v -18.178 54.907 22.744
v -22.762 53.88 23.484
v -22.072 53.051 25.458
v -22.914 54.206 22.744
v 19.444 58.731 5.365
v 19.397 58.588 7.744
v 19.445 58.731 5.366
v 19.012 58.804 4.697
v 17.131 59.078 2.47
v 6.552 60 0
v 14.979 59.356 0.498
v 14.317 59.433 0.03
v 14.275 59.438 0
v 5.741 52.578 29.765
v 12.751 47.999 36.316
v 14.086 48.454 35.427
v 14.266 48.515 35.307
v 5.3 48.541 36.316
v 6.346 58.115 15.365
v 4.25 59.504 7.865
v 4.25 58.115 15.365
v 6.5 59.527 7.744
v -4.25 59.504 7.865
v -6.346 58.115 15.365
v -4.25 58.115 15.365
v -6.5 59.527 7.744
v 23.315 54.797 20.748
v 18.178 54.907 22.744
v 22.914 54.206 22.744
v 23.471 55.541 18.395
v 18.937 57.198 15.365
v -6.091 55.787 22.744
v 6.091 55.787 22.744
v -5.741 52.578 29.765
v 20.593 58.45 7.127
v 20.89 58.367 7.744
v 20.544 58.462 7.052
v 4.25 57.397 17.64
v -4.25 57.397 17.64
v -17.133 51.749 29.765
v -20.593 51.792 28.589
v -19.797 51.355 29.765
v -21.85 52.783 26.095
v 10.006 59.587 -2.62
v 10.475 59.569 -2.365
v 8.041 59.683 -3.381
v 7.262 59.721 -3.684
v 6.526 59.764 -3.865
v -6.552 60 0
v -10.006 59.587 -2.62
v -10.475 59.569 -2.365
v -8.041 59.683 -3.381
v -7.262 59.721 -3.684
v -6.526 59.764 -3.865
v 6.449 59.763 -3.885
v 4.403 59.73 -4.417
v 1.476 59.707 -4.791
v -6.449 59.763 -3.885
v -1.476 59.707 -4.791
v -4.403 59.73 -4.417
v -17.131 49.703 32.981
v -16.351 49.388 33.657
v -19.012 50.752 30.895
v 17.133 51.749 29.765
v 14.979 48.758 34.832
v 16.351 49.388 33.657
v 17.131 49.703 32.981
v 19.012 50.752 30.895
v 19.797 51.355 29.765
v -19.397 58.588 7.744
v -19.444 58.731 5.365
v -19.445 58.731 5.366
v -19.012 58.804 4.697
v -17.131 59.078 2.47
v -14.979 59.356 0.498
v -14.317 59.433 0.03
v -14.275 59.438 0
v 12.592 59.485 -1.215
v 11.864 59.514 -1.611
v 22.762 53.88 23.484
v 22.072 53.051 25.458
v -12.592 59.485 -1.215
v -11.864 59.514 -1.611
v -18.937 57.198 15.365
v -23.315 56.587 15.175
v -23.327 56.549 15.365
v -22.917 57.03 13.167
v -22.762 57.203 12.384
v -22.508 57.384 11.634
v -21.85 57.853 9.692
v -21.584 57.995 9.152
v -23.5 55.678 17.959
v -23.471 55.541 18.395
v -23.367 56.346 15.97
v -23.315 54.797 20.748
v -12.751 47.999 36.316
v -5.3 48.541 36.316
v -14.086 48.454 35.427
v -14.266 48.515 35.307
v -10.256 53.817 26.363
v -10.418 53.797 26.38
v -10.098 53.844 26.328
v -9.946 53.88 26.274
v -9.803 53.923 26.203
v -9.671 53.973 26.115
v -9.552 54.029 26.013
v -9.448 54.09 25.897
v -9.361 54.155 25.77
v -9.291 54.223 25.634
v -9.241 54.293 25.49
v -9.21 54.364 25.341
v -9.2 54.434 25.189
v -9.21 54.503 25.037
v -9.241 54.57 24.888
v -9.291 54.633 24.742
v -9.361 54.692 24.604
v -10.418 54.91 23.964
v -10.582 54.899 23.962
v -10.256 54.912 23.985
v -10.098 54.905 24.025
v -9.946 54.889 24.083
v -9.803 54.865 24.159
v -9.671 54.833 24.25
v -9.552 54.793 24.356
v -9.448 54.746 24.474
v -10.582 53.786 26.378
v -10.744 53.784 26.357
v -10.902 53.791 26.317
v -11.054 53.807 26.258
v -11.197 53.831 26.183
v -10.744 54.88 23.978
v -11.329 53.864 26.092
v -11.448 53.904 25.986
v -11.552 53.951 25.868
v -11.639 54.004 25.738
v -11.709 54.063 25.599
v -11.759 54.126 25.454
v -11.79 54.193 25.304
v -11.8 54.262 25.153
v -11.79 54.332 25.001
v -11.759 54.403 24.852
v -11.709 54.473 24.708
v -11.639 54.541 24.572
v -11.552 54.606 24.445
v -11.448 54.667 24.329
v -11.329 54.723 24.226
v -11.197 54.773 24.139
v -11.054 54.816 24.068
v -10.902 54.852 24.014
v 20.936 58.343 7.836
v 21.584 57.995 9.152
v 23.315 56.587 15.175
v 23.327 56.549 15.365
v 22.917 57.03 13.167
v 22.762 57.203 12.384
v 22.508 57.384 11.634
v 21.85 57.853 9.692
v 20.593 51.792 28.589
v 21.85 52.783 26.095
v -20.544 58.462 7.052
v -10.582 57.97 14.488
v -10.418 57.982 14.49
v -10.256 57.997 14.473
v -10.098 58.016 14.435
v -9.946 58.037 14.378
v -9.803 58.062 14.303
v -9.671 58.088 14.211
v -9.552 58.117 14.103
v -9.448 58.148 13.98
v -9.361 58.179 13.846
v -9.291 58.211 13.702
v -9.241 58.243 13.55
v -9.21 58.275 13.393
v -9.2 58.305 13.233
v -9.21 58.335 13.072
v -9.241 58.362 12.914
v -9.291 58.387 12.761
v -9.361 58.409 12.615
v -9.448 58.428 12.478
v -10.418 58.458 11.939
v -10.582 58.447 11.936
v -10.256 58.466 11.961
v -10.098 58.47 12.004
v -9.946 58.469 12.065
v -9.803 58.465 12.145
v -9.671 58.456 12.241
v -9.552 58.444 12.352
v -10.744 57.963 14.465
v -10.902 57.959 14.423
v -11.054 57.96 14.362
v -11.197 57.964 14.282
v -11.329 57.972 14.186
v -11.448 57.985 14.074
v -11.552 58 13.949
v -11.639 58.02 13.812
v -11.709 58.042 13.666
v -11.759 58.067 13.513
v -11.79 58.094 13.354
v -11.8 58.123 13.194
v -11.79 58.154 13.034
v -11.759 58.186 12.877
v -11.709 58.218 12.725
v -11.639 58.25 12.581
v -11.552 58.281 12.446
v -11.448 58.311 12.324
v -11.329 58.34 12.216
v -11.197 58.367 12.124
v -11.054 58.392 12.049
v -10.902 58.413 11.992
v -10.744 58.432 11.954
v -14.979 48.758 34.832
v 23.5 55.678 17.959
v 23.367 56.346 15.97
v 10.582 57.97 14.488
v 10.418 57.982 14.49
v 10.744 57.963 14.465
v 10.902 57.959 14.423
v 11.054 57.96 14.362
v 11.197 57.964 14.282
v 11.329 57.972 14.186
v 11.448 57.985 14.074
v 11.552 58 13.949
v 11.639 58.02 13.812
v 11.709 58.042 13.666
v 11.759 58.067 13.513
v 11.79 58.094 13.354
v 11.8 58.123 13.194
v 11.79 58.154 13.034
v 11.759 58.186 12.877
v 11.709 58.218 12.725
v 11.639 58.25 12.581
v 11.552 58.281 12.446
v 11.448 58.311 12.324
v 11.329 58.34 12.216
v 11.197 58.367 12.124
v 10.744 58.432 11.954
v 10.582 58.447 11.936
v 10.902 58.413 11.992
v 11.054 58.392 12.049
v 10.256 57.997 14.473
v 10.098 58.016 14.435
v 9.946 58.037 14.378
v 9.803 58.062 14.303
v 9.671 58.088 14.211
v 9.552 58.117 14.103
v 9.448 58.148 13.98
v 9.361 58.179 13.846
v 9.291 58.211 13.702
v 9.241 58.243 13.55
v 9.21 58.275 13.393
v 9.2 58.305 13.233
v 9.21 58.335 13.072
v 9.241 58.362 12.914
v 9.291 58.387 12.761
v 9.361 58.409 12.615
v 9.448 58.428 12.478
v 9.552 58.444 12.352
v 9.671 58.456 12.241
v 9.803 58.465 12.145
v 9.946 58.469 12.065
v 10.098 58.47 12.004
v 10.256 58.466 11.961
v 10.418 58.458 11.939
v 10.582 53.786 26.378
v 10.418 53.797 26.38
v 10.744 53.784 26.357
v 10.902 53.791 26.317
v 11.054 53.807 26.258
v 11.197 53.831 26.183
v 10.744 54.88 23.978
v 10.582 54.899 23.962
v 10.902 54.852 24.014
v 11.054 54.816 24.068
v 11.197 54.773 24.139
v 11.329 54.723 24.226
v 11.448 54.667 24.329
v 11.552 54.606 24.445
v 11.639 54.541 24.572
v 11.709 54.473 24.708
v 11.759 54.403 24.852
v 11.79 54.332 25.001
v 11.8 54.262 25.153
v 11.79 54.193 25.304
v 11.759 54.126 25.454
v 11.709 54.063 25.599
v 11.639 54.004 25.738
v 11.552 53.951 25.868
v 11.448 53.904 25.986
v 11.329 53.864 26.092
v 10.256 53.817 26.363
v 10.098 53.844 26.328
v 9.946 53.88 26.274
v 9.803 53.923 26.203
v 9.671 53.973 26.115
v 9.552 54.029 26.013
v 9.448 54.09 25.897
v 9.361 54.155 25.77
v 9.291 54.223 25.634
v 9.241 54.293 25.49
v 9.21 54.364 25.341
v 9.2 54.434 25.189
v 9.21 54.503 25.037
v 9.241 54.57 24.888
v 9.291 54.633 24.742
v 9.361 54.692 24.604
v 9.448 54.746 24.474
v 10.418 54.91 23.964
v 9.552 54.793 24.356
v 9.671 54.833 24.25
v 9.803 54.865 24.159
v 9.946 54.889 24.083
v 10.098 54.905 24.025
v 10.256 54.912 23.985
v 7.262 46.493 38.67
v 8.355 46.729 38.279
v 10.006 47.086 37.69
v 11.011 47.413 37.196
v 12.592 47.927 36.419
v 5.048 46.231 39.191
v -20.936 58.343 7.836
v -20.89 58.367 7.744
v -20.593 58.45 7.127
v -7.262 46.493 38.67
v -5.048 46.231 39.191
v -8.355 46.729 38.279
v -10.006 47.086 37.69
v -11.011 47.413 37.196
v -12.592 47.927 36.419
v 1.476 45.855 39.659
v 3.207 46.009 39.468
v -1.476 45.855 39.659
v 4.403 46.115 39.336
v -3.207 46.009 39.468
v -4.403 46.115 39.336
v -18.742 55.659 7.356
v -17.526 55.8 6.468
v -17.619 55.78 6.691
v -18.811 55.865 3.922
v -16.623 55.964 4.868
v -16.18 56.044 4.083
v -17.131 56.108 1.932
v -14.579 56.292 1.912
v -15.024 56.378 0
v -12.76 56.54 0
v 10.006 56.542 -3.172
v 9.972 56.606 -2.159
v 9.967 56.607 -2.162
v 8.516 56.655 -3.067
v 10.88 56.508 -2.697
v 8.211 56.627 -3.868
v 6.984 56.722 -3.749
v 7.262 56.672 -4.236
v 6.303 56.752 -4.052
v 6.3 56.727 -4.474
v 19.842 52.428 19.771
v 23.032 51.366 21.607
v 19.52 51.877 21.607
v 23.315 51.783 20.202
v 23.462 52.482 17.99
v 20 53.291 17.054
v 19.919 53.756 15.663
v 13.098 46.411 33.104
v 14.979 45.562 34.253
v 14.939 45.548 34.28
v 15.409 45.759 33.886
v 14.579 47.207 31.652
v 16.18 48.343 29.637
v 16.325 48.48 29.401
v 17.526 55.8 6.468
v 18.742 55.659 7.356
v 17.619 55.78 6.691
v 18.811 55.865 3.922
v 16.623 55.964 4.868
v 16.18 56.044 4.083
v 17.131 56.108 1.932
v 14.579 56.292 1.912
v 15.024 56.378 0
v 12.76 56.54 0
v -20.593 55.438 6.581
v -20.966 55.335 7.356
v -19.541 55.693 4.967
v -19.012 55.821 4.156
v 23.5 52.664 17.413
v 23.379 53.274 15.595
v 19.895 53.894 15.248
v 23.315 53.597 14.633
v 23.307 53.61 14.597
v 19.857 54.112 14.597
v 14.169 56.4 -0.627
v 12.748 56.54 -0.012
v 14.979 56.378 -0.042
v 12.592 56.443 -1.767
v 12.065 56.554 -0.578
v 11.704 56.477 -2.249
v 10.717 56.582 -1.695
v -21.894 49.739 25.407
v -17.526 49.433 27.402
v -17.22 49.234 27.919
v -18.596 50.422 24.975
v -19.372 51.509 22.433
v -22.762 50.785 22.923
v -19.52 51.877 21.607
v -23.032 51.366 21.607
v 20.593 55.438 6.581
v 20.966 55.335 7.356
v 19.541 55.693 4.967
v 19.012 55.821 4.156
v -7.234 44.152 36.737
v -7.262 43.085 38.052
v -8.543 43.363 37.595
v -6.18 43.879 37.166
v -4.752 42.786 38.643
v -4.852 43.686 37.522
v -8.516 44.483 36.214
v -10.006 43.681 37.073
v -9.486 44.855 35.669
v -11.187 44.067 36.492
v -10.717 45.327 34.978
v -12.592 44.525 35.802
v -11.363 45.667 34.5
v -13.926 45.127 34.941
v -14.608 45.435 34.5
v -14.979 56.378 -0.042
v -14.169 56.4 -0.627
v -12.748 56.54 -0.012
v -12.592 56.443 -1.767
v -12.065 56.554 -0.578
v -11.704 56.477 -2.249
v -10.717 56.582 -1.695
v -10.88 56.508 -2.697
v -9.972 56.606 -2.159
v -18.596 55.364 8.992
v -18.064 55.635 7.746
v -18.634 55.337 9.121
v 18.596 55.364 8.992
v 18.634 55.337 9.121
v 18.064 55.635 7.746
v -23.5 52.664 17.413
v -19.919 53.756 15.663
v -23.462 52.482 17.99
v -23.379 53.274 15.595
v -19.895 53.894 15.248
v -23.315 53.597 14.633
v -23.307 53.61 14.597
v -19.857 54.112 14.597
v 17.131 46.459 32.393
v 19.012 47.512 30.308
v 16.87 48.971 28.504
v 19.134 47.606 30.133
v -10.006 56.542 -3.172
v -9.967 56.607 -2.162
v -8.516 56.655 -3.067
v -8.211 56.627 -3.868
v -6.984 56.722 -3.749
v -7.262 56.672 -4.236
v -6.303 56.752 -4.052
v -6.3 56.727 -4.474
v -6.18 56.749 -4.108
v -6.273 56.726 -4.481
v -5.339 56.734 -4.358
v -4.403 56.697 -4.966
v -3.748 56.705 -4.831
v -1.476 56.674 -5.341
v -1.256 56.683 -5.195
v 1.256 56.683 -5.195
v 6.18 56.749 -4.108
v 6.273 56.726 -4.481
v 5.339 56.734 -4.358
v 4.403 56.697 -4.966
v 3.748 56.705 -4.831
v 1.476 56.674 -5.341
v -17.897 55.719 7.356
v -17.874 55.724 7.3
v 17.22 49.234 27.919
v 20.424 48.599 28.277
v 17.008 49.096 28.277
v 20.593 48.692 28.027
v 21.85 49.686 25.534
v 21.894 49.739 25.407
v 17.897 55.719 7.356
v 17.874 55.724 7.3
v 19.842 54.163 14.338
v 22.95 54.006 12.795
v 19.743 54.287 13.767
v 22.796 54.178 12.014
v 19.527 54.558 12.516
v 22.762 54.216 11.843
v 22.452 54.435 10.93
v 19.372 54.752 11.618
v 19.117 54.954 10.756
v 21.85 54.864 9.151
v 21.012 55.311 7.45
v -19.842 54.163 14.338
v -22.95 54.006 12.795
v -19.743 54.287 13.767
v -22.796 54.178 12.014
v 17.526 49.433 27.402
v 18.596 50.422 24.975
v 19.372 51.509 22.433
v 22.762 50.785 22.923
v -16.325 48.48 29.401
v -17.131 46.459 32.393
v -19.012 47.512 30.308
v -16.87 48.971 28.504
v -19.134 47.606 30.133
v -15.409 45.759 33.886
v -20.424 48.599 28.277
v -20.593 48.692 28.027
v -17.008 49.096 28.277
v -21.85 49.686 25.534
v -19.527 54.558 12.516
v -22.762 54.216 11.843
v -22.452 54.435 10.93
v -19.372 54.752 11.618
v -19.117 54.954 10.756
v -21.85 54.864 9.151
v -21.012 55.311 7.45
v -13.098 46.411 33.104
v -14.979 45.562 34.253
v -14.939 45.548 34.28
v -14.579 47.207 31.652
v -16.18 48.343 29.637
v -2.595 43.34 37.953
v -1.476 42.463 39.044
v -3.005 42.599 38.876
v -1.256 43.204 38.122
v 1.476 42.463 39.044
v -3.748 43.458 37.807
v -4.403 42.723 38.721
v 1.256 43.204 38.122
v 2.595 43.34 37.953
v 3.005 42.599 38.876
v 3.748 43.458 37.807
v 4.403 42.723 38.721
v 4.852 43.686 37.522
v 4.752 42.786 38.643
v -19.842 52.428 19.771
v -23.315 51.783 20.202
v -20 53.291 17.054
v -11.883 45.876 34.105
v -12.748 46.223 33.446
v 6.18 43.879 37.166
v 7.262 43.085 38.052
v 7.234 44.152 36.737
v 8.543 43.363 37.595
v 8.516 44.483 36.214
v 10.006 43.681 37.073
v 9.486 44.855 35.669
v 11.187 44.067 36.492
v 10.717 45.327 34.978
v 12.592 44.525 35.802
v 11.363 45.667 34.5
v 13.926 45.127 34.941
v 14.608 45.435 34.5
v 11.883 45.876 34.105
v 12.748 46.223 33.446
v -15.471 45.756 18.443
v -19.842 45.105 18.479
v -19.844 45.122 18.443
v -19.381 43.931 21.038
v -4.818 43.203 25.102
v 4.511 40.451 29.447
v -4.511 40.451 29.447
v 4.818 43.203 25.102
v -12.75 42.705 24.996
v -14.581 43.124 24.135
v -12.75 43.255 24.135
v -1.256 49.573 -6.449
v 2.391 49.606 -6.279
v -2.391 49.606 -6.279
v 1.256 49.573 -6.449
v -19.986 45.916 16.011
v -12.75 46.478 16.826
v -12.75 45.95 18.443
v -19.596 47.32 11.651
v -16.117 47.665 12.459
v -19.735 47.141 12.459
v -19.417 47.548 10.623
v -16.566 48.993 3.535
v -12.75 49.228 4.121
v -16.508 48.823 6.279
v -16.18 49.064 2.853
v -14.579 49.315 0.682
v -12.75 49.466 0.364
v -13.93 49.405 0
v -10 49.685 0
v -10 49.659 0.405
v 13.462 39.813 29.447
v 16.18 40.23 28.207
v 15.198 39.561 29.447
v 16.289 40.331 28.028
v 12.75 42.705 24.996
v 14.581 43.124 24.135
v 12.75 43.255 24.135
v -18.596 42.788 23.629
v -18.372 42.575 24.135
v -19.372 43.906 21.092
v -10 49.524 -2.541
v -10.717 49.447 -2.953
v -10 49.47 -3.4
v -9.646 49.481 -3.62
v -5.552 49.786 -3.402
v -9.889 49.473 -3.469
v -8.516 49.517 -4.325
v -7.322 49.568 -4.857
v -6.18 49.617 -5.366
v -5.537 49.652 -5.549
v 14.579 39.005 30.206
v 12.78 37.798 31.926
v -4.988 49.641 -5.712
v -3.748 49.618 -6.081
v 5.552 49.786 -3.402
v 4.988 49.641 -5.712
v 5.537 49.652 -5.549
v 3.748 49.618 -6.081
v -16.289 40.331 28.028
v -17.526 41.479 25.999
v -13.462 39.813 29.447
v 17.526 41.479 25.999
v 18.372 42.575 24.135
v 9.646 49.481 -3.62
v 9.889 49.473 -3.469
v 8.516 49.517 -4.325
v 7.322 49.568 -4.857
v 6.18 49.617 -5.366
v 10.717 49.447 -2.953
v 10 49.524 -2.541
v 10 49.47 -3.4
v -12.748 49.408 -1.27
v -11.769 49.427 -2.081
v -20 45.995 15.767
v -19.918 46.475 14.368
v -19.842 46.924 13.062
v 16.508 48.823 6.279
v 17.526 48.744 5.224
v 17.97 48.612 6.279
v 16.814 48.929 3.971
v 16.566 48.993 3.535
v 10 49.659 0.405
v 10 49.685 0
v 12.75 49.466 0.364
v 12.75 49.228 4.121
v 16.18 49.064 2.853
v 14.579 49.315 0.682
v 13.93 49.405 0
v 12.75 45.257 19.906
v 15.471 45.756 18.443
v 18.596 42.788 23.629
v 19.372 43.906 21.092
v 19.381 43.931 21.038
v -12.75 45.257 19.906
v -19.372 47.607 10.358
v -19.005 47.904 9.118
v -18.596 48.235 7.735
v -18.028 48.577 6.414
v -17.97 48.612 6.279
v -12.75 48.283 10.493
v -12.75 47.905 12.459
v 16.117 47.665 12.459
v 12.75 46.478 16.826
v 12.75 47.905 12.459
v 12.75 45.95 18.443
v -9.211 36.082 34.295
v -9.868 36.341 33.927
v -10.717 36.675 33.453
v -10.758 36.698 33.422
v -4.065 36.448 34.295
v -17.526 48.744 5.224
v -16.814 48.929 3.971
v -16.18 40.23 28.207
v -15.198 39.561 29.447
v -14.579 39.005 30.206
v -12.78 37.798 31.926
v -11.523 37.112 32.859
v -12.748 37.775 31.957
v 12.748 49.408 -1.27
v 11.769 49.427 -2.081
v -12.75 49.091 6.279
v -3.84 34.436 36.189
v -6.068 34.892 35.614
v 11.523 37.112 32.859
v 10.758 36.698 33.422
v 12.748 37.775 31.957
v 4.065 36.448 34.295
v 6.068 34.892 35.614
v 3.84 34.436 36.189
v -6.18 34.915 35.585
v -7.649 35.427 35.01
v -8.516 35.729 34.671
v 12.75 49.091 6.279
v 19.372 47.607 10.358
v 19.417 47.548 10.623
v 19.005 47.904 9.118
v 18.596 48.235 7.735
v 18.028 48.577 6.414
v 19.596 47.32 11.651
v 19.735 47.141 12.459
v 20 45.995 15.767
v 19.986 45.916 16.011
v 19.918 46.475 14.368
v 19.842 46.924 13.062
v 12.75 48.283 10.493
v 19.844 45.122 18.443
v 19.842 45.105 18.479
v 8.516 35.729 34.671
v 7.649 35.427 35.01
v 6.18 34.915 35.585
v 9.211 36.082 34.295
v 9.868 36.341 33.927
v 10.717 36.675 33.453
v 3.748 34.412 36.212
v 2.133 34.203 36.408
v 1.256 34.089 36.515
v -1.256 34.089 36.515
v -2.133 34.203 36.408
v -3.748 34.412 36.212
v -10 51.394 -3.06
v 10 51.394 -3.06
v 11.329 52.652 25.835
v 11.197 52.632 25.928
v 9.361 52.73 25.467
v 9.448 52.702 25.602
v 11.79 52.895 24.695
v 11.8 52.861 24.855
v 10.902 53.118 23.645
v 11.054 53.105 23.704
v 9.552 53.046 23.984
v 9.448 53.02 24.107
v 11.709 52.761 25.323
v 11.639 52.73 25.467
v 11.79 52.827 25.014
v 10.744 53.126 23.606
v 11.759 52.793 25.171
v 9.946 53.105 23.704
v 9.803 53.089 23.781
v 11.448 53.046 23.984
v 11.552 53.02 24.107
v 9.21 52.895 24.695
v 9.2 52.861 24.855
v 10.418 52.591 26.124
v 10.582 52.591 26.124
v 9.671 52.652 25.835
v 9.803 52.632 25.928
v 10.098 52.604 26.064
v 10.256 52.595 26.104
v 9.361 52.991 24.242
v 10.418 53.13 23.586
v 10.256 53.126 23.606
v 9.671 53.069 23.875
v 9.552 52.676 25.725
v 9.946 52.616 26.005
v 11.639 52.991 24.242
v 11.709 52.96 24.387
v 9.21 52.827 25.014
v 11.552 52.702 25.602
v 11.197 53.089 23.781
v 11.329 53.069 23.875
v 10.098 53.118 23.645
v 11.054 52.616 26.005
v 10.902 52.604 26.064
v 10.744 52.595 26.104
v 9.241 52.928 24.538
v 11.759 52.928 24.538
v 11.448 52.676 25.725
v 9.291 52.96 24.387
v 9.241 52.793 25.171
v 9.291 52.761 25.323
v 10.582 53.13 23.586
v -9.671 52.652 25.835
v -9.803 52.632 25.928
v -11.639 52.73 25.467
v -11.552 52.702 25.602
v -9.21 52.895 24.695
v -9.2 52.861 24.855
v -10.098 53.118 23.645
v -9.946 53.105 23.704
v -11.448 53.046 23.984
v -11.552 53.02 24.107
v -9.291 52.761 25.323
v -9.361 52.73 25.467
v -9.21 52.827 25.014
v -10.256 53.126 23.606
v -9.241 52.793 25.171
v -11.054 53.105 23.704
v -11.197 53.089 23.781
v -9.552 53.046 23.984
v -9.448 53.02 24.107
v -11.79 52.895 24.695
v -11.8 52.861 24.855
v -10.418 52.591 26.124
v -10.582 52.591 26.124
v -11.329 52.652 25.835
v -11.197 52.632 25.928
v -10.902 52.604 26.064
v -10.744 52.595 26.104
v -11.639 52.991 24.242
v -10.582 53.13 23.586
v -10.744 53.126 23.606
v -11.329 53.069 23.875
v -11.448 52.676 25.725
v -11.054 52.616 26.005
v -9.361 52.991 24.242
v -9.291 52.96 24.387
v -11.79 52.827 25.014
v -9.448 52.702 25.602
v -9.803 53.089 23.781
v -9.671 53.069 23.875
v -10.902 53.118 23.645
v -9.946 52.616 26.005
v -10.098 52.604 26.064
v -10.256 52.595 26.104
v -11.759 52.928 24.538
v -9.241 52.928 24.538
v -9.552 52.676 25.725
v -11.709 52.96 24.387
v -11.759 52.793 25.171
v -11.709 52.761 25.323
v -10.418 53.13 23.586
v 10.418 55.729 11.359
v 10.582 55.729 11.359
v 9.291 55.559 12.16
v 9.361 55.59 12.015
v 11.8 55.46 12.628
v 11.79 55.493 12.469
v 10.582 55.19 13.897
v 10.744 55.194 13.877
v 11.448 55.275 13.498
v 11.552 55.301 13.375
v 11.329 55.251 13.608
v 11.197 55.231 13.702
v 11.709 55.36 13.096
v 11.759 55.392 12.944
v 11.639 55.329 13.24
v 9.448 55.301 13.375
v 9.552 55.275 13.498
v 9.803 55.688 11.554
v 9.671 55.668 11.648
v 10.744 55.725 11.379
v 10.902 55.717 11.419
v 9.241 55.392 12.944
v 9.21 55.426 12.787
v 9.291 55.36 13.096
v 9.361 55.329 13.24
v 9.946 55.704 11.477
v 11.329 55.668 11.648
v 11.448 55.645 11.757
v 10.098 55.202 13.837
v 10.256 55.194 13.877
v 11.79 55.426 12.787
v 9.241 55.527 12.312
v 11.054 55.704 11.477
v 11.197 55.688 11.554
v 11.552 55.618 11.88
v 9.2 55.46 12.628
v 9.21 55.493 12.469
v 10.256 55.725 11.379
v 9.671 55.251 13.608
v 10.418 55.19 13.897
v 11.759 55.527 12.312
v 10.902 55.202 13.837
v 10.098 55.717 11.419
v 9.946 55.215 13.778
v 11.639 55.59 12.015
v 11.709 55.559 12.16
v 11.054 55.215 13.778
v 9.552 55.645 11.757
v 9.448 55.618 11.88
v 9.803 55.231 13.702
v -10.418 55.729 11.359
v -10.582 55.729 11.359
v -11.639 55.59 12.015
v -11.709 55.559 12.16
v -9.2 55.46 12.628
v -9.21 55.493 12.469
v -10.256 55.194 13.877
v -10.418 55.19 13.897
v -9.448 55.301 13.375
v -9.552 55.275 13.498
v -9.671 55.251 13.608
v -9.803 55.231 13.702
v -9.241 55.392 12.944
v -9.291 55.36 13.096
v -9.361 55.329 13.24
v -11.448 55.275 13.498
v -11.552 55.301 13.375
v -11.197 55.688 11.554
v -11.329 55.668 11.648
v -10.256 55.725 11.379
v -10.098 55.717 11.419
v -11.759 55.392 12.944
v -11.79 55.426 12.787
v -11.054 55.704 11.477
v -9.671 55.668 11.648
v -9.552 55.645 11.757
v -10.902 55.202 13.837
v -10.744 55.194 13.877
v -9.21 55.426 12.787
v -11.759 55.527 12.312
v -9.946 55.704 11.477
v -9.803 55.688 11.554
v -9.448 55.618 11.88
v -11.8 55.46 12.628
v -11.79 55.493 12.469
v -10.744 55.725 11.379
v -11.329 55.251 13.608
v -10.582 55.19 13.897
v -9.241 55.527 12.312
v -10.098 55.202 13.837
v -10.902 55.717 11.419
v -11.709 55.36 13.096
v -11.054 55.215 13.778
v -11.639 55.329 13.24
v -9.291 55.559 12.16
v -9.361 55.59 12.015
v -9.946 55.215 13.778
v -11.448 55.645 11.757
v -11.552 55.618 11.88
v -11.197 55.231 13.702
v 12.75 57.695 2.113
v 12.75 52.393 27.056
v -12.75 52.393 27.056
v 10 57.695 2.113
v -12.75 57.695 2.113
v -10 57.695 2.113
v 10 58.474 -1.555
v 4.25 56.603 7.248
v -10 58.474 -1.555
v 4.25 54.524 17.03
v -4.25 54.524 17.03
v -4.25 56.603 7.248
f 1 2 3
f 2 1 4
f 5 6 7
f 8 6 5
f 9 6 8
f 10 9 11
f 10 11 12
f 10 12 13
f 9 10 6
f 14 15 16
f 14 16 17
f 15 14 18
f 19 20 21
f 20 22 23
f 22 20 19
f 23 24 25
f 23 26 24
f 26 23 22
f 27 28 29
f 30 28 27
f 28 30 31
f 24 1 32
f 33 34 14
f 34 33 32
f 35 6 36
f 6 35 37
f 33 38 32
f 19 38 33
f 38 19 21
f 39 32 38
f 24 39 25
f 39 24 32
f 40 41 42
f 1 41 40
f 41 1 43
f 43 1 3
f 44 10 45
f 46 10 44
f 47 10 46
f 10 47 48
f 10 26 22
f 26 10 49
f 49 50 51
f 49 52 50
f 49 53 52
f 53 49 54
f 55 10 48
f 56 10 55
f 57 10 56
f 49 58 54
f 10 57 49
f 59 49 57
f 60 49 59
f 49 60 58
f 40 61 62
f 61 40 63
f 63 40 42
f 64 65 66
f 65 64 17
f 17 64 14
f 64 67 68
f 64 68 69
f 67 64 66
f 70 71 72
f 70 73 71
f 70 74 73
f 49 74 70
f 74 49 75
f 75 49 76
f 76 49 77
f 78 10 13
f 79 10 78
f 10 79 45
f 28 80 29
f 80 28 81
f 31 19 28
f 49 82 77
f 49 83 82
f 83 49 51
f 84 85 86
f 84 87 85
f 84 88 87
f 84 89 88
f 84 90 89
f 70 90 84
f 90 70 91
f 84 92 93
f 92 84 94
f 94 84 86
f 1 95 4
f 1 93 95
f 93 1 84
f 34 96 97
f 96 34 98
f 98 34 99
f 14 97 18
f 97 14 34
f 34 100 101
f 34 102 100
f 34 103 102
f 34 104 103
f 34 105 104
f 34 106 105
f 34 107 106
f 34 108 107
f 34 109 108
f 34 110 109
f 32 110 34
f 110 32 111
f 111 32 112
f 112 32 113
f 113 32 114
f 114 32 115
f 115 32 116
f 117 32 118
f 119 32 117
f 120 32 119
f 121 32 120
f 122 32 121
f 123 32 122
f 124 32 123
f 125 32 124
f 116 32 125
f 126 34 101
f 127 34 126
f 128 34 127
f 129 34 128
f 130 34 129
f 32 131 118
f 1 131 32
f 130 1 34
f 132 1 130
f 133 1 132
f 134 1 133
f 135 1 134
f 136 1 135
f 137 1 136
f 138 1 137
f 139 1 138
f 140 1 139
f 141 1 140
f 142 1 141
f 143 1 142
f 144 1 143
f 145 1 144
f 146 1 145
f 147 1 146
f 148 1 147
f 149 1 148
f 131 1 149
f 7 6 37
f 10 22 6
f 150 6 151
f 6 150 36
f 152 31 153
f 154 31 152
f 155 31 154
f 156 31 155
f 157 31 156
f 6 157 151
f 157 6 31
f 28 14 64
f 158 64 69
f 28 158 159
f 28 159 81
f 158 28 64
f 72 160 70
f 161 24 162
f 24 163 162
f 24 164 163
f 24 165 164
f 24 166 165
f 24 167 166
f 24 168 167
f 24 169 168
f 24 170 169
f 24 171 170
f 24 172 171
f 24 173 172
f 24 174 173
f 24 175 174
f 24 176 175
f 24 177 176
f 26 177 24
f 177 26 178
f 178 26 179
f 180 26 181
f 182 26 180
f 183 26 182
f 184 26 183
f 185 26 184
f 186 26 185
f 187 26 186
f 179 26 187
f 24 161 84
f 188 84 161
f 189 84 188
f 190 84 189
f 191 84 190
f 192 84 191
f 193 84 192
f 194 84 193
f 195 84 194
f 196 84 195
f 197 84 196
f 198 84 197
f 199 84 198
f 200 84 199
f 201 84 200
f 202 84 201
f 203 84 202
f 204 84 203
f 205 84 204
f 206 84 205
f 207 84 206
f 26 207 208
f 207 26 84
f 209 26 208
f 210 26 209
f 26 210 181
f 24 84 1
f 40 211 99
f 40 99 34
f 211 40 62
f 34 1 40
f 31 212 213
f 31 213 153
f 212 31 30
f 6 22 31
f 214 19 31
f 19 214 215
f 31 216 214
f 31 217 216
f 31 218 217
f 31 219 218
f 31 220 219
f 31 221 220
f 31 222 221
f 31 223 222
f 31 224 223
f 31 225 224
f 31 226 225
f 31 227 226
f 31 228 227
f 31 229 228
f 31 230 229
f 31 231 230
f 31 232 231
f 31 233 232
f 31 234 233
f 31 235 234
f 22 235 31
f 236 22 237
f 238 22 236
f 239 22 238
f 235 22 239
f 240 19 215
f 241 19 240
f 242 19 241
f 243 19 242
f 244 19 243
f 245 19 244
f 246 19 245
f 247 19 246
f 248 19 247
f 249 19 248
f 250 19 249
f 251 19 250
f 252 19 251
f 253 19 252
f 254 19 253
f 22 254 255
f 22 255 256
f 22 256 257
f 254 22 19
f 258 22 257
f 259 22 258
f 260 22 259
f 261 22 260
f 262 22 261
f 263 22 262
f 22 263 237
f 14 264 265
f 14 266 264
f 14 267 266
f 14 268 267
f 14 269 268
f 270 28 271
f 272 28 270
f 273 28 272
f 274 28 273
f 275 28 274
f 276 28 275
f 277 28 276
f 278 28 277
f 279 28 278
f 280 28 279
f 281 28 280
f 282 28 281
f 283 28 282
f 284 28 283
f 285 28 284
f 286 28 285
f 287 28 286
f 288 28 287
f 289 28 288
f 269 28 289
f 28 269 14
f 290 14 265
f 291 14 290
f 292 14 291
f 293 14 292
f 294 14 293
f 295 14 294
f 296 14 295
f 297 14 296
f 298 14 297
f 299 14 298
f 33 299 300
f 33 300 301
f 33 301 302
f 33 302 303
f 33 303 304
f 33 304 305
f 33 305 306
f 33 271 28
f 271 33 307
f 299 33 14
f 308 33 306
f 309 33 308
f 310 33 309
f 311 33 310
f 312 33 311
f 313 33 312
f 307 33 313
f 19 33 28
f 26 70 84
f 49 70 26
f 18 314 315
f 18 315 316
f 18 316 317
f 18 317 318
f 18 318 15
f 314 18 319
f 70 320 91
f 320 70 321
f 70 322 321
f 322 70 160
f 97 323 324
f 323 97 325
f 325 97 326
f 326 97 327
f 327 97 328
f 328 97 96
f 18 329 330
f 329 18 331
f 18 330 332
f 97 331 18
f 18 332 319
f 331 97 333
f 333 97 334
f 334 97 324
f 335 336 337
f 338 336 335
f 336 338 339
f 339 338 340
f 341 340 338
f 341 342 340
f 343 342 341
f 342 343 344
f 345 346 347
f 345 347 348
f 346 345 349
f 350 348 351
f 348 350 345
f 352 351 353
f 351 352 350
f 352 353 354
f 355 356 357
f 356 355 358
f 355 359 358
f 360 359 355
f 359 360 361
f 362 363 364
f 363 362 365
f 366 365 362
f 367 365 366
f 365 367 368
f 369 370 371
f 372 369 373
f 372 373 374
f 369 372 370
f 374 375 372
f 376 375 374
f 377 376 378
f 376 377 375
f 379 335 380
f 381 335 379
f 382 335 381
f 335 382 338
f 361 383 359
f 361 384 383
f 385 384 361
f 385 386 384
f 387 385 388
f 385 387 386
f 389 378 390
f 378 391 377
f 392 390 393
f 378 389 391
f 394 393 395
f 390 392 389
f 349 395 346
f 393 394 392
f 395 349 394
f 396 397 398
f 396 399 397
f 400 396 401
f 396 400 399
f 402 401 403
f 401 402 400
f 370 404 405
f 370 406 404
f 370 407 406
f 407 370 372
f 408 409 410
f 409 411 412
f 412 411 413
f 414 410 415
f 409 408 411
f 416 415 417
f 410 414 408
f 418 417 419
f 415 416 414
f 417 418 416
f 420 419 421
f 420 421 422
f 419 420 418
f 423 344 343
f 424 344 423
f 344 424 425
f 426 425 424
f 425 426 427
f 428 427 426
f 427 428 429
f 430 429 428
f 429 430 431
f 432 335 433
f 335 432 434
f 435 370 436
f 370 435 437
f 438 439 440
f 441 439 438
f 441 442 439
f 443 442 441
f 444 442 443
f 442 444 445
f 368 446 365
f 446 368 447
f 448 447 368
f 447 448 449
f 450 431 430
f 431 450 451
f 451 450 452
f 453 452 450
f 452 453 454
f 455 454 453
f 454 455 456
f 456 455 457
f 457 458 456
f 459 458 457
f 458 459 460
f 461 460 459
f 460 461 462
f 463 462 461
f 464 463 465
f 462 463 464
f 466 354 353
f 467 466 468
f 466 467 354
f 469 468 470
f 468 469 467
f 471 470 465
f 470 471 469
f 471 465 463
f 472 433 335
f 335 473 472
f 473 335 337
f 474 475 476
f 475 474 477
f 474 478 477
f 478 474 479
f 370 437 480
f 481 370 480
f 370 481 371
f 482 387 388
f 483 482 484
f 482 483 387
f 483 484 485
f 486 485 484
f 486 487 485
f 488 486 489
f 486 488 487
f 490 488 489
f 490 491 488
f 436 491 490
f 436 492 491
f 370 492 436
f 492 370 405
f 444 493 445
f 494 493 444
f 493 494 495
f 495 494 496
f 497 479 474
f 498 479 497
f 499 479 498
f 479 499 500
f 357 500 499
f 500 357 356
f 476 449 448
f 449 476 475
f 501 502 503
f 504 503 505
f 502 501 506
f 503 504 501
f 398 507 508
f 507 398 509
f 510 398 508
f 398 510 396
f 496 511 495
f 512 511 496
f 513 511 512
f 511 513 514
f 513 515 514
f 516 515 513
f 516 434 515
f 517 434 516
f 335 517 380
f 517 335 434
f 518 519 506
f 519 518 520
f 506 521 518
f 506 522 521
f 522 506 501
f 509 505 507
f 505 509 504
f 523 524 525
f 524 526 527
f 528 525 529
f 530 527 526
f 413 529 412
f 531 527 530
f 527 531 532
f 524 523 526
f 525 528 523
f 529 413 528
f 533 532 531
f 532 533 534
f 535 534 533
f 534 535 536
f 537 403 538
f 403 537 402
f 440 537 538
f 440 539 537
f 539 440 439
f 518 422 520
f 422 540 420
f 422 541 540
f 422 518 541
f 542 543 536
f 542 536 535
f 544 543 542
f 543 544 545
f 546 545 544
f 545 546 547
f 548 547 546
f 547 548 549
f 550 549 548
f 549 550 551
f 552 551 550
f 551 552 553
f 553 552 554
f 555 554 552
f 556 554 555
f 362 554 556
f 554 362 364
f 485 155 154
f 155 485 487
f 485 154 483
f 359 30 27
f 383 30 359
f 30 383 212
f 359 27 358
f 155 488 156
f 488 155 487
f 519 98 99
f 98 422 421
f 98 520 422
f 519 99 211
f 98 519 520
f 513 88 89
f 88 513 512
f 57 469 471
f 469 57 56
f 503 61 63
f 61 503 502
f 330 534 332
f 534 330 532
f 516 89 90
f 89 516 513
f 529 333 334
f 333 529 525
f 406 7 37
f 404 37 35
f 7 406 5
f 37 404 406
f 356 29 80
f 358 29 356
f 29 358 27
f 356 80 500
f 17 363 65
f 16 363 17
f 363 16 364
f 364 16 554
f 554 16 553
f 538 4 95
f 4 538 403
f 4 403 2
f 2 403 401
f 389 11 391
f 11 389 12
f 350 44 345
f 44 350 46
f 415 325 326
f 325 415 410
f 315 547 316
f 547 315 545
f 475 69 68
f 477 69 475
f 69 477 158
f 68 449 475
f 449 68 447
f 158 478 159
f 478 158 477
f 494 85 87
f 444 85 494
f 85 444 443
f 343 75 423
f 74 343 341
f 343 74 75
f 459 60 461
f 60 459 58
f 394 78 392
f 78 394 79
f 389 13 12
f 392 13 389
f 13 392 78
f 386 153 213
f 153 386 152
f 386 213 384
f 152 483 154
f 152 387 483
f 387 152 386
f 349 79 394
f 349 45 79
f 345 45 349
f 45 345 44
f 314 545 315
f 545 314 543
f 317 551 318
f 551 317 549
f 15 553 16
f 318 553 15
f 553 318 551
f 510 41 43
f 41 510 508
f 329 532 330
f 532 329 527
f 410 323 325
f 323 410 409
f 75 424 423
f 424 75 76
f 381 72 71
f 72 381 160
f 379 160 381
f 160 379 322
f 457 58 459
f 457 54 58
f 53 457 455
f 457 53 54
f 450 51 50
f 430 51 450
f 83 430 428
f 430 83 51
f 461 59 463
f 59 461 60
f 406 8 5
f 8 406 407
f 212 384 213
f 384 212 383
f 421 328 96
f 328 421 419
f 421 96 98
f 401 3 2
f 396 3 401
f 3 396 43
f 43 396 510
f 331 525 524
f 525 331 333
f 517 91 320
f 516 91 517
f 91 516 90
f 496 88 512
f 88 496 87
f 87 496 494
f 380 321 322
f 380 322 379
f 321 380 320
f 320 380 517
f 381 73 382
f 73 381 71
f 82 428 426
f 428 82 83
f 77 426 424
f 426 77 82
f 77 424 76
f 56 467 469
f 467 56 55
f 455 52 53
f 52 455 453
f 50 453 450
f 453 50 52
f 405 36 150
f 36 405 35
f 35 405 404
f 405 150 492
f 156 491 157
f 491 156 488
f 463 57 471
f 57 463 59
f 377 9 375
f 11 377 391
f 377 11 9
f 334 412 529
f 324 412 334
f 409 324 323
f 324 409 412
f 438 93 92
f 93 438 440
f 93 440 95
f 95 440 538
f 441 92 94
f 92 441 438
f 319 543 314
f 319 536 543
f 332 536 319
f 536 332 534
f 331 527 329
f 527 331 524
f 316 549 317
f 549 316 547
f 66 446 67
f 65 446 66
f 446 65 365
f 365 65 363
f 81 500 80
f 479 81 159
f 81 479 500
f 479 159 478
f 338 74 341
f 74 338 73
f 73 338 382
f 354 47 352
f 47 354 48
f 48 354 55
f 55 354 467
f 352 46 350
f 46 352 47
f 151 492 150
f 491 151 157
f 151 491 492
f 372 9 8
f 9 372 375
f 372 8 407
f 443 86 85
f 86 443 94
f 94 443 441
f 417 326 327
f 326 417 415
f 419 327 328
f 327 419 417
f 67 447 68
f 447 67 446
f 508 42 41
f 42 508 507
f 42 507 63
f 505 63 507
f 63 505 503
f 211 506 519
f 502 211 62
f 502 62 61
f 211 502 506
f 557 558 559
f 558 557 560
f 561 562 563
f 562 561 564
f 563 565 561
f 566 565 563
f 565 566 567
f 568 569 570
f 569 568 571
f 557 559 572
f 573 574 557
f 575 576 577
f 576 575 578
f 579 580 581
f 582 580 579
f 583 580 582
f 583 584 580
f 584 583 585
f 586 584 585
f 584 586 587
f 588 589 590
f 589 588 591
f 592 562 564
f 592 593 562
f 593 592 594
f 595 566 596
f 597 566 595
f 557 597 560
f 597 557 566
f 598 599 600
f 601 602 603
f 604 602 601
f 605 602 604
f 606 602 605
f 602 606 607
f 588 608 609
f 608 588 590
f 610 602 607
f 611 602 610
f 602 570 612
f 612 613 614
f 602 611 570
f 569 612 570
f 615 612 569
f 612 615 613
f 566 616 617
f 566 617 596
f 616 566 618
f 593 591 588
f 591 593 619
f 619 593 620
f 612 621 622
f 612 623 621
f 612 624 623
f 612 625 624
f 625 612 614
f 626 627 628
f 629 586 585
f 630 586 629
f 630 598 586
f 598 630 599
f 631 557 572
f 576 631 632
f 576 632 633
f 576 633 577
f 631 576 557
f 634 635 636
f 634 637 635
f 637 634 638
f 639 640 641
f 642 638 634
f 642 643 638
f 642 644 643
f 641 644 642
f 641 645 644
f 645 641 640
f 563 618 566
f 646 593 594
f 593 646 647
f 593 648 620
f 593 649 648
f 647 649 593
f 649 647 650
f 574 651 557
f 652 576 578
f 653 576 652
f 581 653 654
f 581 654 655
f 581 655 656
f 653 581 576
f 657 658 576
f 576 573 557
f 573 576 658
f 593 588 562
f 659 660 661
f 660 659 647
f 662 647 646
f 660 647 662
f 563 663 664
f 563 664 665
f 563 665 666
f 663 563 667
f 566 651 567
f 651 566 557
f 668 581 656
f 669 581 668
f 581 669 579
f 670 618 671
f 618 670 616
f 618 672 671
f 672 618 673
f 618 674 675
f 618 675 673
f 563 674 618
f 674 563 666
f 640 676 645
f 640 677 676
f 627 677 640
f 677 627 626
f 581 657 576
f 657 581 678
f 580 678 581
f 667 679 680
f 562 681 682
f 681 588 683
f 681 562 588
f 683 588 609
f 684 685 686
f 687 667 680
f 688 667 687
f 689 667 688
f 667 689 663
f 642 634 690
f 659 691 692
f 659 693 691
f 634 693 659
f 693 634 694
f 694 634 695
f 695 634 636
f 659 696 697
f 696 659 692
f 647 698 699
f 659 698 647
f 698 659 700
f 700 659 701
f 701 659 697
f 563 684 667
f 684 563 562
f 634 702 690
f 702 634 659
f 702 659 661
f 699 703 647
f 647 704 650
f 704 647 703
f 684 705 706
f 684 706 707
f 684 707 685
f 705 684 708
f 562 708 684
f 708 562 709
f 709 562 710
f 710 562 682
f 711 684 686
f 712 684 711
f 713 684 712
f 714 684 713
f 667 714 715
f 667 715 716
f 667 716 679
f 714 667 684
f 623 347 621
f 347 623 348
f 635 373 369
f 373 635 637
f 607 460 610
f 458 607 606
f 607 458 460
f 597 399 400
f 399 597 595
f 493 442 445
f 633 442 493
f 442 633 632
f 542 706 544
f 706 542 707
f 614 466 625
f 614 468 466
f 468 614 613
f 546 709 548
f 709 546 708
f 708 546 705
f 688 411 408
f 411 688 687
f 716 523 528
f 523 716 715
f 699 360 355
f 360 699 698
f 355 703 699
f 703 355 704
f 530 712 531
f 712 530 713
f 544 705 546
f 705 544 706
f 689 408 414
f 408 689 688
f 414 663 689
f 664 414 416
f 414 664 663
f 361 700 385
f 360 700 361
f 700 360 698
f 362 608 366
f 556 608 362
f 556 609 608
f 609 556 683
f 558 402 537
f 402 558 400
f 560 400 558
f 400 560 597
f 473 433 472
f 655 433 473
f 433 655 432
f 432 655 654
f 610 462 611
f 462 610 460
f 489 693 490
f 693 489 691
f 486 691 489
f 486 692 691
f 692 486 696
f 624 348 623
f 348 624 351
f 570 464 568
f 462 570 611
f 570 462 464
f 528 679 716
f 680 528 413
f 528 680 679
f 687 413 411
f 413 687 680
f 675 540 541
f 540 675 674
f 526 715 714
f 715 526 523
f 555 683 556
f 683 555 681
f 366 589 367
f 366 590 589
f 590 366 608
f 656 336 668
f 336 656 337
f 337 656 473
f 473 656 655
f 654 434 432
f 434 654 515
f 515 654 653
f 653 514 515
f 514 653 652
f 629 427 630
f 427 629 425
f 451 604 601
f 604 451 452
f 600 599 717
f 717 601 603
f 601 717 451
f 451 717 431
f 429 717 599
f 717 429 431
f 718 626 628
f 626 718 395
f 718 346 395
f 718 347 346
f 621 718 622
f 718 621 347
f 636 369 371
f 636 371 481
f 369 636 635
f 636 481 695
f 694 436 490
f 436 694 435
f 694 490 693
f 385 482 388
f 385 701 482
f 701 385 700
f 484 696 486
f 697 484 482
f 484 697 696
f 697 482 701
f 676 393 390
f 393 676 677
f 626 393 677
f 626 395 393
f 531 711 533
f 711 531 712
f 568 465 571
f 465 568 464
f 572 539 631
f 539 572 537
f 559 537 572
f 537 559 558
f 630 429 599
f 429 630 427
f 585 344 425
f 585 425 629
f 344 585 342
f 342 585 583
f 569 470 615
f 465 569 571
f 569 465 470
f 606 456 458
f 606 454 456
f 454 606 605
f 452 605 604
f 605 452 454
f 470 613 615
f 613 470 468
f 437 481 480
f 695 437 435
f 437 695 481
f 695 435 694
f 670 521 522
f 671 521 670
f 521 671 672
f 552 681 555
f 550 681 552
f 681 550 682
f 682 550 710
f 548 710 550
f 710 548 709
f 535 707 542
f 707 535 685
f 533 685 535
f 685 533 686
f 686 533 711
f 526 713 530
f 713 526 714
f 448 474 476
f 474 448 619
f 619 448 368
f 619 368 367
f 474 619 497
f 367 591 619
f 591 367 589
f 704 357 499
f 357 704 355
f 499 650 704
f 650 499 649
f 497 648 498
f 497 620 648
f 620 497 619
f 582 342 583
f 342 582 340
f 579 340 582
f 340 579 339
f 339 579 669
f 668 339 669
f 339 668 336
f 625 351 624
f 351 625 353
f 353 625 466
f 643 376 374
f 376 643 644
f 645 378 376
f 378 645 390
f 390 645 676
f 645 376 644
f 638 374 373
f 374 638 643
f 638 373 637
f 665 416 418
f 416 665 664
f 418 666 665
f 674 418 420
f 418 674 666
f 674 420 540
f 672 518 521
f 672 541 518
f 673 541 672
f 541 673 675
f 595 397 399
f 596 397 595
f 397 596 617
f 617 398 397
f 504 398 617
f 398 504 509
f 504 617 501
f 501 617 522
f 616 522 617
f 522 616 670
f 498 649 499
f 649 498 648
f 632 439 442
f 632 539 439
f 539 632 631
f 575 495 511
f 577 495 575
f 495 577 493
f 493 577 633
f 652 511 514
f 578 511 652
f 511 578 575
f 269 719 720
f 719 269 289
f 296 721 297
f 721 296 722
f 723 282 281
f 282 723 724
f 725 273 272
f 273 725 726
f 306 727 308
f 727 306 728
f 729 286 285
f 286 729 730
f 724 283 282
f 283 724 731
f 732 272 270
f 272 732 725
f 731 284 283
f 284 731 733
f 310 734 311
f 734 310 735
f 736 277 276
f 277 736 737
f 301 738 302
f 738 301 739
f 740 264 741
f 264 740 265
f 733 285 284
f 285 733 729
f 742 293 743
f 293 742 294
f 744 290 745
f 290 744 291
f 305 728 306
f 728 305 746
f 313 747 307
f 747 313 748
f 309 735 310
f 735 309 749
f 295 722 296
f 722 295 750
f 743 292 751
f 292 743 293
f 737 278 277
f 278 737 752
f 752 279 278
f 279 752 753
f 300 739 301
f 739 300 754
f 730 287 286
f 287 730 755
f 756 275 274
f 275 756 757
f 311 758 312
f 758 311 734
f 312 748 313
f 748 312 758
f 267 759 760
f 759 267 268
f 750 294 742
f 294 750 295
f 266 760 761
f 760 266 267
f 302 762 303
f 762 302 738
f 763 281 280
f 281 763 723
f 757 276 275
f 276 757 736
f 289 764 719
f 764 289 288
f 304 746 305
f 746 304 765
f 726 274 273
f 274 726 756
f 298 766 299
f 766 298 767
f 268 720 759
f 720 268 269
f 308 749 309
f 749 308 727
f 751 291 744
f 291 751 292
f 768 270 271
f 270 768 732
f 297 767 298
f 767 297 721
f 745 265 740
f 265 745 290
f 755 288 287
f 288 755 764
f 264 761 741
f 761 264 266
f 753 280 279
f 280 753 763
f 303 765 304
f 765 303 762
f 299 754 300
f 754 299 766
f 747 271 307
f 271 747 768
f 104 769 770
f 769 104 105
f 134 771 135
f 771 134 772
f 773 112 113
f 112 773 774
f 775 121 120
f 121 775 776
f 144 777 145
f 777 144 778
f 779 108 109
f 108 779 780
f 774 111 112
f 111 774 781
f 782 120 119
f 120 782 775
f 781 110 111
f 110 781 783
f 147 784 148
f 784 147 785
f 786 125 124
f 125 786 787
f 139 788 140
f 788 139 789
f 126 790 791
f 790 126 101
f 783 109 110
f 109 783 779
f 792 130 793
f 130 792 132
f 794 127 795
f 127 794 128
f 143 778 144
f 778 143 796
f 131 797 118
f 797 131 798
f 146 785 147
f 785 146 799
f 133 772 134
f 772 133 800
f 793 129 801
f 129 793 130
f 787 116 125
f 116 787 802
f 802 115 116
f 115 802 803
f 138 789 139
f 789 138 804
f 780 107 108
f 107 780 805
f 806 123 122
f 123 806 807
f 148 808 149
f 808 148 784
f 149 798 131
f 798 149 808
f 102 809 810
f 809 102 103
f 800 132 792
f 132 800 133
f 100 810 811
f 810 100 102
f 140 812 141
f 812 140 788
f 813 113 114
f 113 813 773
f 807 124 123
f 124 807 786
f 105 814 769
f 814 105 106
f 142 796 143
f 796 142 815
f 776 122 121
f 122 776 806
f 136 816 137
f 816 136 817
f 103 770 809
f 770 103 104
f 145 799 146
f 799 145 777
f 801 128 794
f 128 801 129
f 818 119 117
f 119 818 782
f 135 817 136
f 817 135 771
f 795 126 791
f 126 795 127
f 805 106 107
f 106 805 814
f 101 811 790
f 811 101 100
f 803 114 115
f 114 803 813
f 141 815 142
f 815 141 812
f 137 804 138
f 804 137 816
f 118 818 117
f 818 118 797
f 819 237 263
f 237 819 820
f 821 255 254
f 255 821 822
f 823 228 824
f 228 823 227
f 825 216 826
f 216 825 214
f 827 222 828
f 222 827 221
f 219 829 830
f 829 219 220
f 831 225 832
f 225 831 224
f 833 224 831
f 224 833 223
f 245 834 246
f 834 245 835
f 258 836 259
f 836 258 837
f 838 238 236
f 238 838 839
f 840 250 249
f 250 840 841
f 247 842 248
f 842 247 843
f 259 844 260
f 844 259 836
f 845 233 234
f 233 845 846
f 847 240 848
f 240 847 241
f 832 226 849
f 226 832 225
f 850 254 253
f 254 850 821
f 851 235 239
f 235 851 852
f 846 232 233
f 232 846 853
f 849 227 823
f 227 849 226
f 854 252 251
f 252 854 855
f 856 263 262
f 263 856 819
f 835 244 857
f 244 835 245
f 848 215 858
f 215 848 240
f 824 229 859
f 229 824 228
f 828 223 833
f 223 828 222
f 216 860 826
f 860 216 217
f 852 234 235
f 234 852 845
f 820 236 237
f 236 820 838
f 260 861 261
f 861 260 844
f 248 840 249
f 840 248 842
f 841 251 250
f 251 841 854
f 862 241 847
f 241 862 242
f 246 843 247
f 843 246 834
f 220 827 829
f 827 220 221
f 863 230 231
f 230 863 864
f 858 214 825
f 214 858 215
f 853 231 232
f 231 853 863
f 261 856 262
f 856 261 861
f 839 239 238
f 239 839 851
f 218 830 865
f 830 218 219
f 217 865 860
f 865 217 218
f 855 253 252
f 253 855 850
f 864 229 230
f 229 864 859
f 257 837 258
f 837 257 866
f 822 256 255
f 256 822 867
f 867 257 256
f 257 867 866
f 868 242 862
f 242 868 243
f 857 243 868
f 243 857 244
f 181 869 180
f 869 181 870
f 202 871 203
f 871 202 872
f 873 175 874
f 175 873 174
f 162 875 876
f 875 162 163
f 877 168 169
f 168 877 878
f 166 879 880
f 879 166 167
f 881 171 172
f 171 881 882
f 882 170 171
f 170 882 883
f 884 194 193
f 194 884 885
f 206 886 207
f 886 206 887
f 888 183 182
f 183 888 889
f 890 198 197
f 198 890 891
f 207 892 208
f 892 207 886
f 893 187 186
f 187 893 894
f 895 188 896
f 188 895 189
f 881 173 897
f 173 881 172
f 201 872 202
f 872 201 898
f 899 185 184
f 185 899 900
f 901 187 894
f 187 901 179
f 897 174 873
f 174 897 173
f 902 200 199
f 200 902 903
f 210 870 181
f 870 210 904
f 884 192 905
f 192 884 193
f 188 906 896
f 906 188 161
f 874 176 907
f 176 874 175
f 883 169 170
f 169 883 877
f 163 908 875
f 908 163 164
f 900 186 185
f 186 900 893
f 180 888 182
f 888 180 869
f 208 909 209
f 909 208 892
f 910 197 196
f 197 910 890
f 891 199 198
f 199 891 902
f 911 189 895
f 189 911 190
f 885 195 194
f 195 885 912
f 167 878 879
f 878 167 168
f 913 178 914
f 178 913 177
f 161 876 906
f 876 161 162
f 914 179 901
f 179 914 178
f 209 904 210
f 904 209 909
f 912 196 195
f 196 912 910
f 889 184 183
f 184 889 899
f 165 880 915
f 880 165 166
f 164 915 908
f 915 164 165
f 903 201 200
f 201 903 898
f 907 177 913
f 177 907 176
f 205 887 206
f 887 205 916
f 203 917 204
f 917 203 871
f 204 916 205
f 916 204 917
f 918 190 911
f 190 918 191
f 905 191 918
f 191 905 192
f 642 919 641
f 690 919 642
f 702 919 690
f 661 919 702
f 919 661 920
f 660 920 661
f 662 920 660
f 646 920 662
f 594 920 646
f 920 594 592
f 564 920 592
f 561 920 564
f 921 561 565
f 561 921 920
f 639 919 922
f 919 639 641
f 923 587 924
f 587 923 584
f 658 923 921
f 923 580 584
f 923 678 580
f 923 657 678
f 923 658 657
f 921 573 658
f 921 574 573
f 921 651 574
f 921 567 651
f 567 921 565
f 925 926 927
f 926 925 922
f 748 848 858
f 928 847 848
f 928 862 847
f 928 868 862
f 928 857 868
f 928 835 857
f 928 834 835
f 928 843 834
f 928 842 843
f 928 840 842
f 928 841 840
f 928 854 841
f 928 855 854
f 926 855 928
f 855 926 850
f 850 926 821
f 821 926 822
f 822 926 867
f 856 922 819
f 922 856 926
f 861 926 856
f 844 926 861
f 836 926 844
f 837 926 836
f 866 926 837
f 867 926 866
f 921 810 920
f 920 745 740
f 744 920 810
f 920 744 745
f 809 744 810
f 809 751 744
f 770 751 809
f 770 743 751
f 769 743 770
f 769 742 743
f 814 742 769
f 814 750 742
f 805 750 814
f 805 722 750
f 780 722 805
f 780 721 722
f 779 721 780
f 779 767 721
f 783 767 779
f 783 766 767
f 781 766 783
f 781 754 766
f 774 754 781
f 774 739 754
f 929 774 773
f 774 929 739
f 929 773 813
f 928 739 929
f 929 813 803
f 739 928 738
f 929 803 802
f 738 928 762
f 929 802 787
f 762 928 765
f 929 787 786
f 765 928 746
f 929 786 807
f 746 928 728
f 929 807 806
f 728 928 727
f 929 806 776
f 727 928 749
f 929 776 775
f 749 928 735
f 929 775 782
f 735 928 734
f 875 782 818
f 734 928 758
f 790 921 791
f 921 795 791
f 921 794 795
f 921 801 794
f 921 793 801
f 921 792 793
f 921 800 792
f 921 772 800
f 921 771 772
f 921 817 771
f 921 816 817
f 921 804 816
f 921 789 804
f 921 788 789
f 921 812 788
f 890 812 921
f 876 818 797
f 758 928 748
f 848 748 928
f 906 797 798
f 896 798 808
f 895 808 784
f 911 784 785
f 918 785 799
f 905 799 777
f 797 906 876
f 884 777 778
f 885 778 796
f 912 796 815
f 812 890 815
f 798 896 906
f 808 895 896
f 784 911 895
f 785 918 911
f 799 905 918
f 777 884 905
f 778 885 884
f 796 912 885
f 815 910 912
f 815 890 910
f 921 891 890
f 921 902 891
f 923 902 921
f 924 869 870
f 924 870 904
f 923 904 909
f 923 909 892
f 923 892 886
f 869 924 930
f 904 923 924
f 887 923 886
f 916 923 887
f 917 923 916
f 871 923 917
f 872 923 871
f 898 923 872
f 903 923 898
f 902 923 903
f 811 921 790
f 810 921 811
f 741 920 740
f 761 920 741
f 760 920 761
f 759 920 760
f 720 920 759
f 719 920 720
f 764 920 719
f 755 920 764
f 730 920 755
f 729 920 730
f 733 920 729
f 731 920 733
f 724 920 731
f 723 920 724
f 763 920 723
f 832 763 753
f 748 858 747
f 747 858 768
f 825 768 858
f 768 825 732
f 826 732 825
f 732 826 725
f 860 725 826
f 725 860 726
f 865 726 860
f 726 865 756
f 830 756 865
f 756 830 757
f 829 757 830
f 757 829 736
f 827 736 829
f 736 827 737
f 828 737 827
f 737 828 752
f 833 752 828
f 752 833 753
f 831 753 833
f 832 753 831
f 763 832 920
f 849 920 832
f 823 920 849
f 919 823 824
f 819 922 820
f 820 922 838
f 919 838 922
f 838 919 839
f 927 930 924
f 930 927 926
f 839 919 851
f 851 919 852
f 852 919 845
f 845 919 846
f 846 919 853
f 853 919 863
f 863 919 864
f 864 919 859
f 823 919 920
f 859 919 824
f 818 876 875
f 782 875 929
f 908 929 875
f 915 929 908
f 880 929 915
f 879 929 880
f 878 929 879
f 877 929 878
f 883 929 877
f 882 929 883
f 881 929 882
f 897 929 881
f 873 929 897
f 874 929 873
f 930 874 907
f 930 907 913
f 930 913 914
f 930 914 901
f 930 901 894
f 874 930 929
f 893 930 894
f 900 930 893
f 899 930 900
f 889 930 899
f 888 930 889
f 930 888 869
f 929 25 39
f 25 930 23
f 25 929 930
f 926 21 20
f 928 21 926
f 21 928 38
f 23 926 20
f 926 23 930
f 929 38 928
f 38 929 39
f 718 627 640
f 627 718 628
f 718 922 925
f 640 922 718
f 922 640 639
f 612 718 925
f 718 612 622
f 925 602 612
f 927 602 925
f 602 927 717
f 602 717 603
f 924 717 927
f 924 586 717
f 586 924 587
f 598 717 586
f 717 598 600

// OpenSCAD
//Increase shell thickness
//Change slot for Raspberry 
//Change slot for camera (no need of pan

PIcameraDiam = 8;
PIcameraX = 25;
PIcameraY = 25;
// Raspberry Pi dimensions 85.60mm x 56mm x 21mm 
widht = 148;
depth = 120;
border = widht * 0.2;
T = 6;
2DOF_L = 40;
2DOF_H = 45;
USBH = 20;
USBL = 50 + 6;
FN = 50;
CameraModulePos = [0, 70, 20];
Tolerance= 0.5;
HSupportHoleDiam = 25;

$fn = 50;

//$fs = 0.01; // change me to 0.5 when doing final render for export

phi = 1.618033988749894848204586834;

//-----------------------------------
module HeadShell() {
	difference() {
		resize([widht + border, depth, depth]) sphere(1);
		//Create the inner shell
		resize([widht + border - T, depth - T, depth - T]) sphere(1);
	}
	//Endcaps
	intersection() {
		resize([widht + border, depth, depth ]) sphere(1);
		translate([widht / 2 - 3 / 2, 0, 0]) cube([3, 100, 100], center = true);

	}
	intersection() {
		resize([widht + border, depth, depth]) sphere(1);
		translate([-widht / 2 + 3 / 2, 0, 0]) cube([3, 100, 100], center = true);

	}
}
module H() {
	difference() {
		HeadShell();
		//2DOF slot
		translate(CameraModulePos) rotate([100, 0, 0]) resize([2DOF_L, 2DOF_H, 50]) cylinder(h = 30, r = 100);

		//Two cubes to cut the ends of the head
		translate([widht / 2, -widht / 2, -widht / 2]) cube(widht);
		translate([-3 / 2 * widht, -widht / 2, -widht / 2]) cube(widht);
		//Lower cut
		translate([-widht / 2, -widht / 2, -(widht + 40)]) cube(widht);
		//Holes for buttons
		translate([-widht / 4, -depth / 4, widht / 4]) rotate([45, 30, -45]) ButtonHoleL();
		translate([+widht / 4, -depth / 4, widht / 4]) rotate([45, 30, 0]) ButtonHoleL();

		//Raspberrry slot
		translate([-USBL / 2, -depth / 2, -10]) cube([USBL, 20, USBH]);
 
        translate([-1.1*USBL / 2, -depth / 2, -10]) cube([1.1*USBL, 20, 3 ]);
		//Simulates Raspberry PI dimensions
		//translate([-USBL/2+56,-depth/2,-10])rotate([0,0,90])cube([85.60,56,21]);
        
        //Hole for RGB LED
        translate([0, 0, depth/2]) rotate([0, 0, 0]) cylinder(h=10,r=5/2-Tolerance, center=true);
        
        //Hole for anchoring
		translate([widht / 2, 0, 0]) rotate([90, 180, 90]) cylinder(h=10,r=HSupportHoleDiam/2, center=true);
		//Microserv slot
        translate([-widht / 2 - 10, 0, 0]) rotate([90, 180, 90]) translate([-5.9 - 4.7 / 2, 0, 0]) microservo();

	}
    
    //This is the support fo  rthe raspberry slot
     intersection(){
            HeadShell();
            for (z = [-USBL/2: 2: USBL/2]) 
            {
                translate([z, -depth/2+1, 0])
                cube([0.4,20,USBH], center = true);
            }
            }
		
}
//-----------------------------------

module camera_supportOLD()

{
	translate(CameraModulePos - [0, +5, +6] - [0, 0, T + 12]) rotate([0, 0, 00]) box(13, 24.5, 17, 3);
	difference() {
		translate(CameraModulePos - [0, 0, T + 12]) box(2DOF_L + 2 * T, 2DOF_H, 30, T);

		difference() {
			translate(CameraModulePos - [0, 0, T + 12]) box(2DOF_L + 2 * T, 2DOF_H, 30, T);
			resize([widht + border - T, depth - T, depth - T]) sphere(1, $fn = FN);

		}
	}

}
//-----------------------------------

module box(Xdim, Ydim, Zdim, thickness)
//Creates a box, dimensions are internal
{
	difference() {
		//translate([10,0,-thickness])
		cube([Xdim + thickness, Ydim + thickness, Zdim], center = true);
		translate([0, 0, thickness / 2]) cube([Xdim, Ydim, Zdim], center = true);

		translate([-Xdim / 2, 0, -0.5 * Zdim]) cube([5, Ydim + 2 * thickness, Zdim / 2 + thickness], center = true);
		translate([+Xdim / 2, 0, -0.5 * Zdim]) cube([5, Ydim + 2 * thickness, Zdim / 2 + thickness], center = true);
		translate([+Xdim / 2, 0, 0]) cube([thickness / 2, 0.3 * Ydim, Zdim], center = true);
		translate([-Xdim / 2, 0, 0]) cube([thickness / 2, 0.3 * Ydim, Zdim], center = true);

	}
}

module support() {
	difference() {

		linear_extrude(height = 4, center = true, convexity = 10, twist = 0) polygon(points = [
			[0, 0],
			[0, 16],
			[4, 16]
		]);
		translate([2, 18, 0]) rotate([90, 0, 0]) cylinder(h = 15, d = 1.5);
		translate([0.5, 10, -6]) cube([4, 2, 12], center = false);
	}
}


//-----------------------------------

module CS()
translate(CameraModulePos + [6.25, -25, -32]) {
	box(24.5, 13, 17, T);
	translate([0, 12, 0]) cube([24.5 + T, 5 + T, 17], center = true);
}
//-----------------------------------



module camera_support()

{

	difference() {
		CS();

		difference() {
			CS();
			resize([widht + border - T, depth - T, depth - T]) sphere(1);

		}
	}

}

module ButtonHoleL() {

	cylinder(h = 20, r = 8);
}


module TiltServo() {
	//translate([widht/2-10,0,0])rotate([90,90,90])translate([-35.1,0,0])TiltServo();
	translate([0, -5, 0]) cylinder(h = 20, r = 2.5);
	translate([0, 5, 0]) cylinder(h = 20, r = 2.5);

	translate([50.5, -5, 0]) cylinder(h = 20, r = 2.5);
	translate([50.5, 5, 0]) cylinder(h = 20, r = 2.5);

	translate([35.1, 0, 0]) cylinder(h = 40, r = 5);
	translate([35.1, 0, 0]) cylinder(h = 20, r = 5);

	translate([5, -10.5, 0]) cube([41.50, 21, 20], center = false);
}






module SUB_bearing() {
	cylinder(h = 0.5, r = 25.5 / 2);
	translate([0, 0, 0.5]) cylinder(h = 1.5, r = 30 / 2);
}

module bearingServo() {
	difference() {
		SUB_bearing();
		cylinder(h = 5, r = 2);
	}
}

module bearingNoServo() {
	union() {
		SUB_bearing();
        
		translate([0,0,-6/2])difference(){
            cylinder(h = 8, r = HSupportHoleDiam/2-Tolerance, center=true);
            cylinder(h = 8, r = HSupportHoleDiam/2-Tolerance-4, center=true);
        }
	}
}



module microservo() {

	translate([0, 0, 0]) cylinder(h = 20, r = 1.2);
	translate([27.2, 0, 0]) cylinder(h = 20, r = 1.2);

	translate([5.9 + 4.7 / 2 + 6, 0, 0]) cylinder(h = 40, r = 7 / 2);

	translate([5.9 + 4.7 / 2, 0, 0]) cylinder(h = 40, r = 7);
}

/*difference(){
translate([-5,-10,-0])cube([40,20,2]);
microservo();
}*/


//camera_support();

/*difference(){
translate([-5,-10,0])cube([35,20,1], center=false);
microservo();
}*/

module PiSupport() {
	difference() {

		translate([-USBL / 2, -widht / 2, -USBH / 2 - 5]) cube([USBL, widht, 5]);
		translate([0, 0, -USBH / 2 - 2.5]) cube([USBL - 20, 100, 5], center = true);

		difference() {
			translate([-USBL / 2, -widht / 2, -USBH / 2 - 5]) cube([USBL, widht, 5]);
			resize([widht + border - T, depth - T, depth - T]) sphere(1);
		}
    translate([(USBL - 20)/2+10/2+2.75/2,-widht / 2 +85-58-3,-USBH / 2 -2]){
translate([0, +85-58, -2])cylinder(r=2.75/2-Tolerance, h=10, center=true);
translate([0, +85-58+58, -2])cylinder(r=2.75/2-Tolerance, h=10, center=true);
translate([0-49, +85-58, -2])cylinder(r=2.75/2-Tolerance, h=10, center=true);
translate([0-49, +85-58+58, -2])cylinder(r=2.75/2-Tolerance, h=10, center=true);
}
	}

}




//PiSupport();
//bearingServo();
//bearingNoServo();
 /*               translate([-1, 0, -5])
  cube([USBL,20,2], center = true);
for (z = [-USBL/2: 3: USBL/2]) 
            {
                translate([z, 0, 0])
                cube([0.6,20,10], center = true);
            }
   */


module SUB_PiCamHoles(T) {
// T is the tolerance for holes
        translate([PIcameraX/2-2, 0, PIcameraY/2-2])rotate([90,0,0])cylinder(r=1+T,h=10, center=true);
		translate([-(PIcameraX/2-2), 0, PIcameraY/2-2])rotate([90,0,0])cylinder(r=1+T,h=10, center=true);
		translate([PIcameraX/2-2, 0, (PIcameraY/2-2)-12.5])rotate([90,0,0])cylinder(r=1+T,h=10, center=true);
		translate([-(PIcameraX/2-2), 0, (PIcameraY/2-2)-12.5])rotate([90,0,0])cylinder(r=1+T,h=10, center=true); 
    
}    

module eye(){
resize([widht/4+10,0,+depth/4+15])
intersection()
{
difference() {
		HeadShell();
        
    }

translate(CameraModulePos) rotate([100, 0, 0]) resize([2DOF_L, 2DOF_H, 50]) cylinder(h = 30, r = 100);
}

//difference()

{
intersection()
{
difference() {
		resize([widht + border, depth, depth]) sphere(1);
		//Create the inner shell
		resize([widht + border , depth -20, depth - 20]) sphere(1);
        
    }

translate(CameraModulePos) rotate([100, 0, 0]) resize([2DOF_L, 2DOF_H, 50]) cylinder(h = 30, r = 100);
}
}


}
module PICam()
{
    
{
translate([0,-12,0])cube([PIcameraX + Tolerance, 20, PIcameraY + Tolerance], center = true);
translate([0, 0, -2.5]) 
rotate([90, 0, 0]) cube([PIcameraDiam + Tolerance, 10, PIcameraDiam + Tolerance], center = true);
    translate([0,-12,-PIcameraY/2])cube([PIcameraX - 5, 20, 8], center = true);
//		translate([0,0.9*R,0])
SUB_PiCamHoles(0.3);
}
}

difference()
{
eye();
translate([0,widht/4+20,15])rotate([12,0,0])PICam();
}

//PICam();
